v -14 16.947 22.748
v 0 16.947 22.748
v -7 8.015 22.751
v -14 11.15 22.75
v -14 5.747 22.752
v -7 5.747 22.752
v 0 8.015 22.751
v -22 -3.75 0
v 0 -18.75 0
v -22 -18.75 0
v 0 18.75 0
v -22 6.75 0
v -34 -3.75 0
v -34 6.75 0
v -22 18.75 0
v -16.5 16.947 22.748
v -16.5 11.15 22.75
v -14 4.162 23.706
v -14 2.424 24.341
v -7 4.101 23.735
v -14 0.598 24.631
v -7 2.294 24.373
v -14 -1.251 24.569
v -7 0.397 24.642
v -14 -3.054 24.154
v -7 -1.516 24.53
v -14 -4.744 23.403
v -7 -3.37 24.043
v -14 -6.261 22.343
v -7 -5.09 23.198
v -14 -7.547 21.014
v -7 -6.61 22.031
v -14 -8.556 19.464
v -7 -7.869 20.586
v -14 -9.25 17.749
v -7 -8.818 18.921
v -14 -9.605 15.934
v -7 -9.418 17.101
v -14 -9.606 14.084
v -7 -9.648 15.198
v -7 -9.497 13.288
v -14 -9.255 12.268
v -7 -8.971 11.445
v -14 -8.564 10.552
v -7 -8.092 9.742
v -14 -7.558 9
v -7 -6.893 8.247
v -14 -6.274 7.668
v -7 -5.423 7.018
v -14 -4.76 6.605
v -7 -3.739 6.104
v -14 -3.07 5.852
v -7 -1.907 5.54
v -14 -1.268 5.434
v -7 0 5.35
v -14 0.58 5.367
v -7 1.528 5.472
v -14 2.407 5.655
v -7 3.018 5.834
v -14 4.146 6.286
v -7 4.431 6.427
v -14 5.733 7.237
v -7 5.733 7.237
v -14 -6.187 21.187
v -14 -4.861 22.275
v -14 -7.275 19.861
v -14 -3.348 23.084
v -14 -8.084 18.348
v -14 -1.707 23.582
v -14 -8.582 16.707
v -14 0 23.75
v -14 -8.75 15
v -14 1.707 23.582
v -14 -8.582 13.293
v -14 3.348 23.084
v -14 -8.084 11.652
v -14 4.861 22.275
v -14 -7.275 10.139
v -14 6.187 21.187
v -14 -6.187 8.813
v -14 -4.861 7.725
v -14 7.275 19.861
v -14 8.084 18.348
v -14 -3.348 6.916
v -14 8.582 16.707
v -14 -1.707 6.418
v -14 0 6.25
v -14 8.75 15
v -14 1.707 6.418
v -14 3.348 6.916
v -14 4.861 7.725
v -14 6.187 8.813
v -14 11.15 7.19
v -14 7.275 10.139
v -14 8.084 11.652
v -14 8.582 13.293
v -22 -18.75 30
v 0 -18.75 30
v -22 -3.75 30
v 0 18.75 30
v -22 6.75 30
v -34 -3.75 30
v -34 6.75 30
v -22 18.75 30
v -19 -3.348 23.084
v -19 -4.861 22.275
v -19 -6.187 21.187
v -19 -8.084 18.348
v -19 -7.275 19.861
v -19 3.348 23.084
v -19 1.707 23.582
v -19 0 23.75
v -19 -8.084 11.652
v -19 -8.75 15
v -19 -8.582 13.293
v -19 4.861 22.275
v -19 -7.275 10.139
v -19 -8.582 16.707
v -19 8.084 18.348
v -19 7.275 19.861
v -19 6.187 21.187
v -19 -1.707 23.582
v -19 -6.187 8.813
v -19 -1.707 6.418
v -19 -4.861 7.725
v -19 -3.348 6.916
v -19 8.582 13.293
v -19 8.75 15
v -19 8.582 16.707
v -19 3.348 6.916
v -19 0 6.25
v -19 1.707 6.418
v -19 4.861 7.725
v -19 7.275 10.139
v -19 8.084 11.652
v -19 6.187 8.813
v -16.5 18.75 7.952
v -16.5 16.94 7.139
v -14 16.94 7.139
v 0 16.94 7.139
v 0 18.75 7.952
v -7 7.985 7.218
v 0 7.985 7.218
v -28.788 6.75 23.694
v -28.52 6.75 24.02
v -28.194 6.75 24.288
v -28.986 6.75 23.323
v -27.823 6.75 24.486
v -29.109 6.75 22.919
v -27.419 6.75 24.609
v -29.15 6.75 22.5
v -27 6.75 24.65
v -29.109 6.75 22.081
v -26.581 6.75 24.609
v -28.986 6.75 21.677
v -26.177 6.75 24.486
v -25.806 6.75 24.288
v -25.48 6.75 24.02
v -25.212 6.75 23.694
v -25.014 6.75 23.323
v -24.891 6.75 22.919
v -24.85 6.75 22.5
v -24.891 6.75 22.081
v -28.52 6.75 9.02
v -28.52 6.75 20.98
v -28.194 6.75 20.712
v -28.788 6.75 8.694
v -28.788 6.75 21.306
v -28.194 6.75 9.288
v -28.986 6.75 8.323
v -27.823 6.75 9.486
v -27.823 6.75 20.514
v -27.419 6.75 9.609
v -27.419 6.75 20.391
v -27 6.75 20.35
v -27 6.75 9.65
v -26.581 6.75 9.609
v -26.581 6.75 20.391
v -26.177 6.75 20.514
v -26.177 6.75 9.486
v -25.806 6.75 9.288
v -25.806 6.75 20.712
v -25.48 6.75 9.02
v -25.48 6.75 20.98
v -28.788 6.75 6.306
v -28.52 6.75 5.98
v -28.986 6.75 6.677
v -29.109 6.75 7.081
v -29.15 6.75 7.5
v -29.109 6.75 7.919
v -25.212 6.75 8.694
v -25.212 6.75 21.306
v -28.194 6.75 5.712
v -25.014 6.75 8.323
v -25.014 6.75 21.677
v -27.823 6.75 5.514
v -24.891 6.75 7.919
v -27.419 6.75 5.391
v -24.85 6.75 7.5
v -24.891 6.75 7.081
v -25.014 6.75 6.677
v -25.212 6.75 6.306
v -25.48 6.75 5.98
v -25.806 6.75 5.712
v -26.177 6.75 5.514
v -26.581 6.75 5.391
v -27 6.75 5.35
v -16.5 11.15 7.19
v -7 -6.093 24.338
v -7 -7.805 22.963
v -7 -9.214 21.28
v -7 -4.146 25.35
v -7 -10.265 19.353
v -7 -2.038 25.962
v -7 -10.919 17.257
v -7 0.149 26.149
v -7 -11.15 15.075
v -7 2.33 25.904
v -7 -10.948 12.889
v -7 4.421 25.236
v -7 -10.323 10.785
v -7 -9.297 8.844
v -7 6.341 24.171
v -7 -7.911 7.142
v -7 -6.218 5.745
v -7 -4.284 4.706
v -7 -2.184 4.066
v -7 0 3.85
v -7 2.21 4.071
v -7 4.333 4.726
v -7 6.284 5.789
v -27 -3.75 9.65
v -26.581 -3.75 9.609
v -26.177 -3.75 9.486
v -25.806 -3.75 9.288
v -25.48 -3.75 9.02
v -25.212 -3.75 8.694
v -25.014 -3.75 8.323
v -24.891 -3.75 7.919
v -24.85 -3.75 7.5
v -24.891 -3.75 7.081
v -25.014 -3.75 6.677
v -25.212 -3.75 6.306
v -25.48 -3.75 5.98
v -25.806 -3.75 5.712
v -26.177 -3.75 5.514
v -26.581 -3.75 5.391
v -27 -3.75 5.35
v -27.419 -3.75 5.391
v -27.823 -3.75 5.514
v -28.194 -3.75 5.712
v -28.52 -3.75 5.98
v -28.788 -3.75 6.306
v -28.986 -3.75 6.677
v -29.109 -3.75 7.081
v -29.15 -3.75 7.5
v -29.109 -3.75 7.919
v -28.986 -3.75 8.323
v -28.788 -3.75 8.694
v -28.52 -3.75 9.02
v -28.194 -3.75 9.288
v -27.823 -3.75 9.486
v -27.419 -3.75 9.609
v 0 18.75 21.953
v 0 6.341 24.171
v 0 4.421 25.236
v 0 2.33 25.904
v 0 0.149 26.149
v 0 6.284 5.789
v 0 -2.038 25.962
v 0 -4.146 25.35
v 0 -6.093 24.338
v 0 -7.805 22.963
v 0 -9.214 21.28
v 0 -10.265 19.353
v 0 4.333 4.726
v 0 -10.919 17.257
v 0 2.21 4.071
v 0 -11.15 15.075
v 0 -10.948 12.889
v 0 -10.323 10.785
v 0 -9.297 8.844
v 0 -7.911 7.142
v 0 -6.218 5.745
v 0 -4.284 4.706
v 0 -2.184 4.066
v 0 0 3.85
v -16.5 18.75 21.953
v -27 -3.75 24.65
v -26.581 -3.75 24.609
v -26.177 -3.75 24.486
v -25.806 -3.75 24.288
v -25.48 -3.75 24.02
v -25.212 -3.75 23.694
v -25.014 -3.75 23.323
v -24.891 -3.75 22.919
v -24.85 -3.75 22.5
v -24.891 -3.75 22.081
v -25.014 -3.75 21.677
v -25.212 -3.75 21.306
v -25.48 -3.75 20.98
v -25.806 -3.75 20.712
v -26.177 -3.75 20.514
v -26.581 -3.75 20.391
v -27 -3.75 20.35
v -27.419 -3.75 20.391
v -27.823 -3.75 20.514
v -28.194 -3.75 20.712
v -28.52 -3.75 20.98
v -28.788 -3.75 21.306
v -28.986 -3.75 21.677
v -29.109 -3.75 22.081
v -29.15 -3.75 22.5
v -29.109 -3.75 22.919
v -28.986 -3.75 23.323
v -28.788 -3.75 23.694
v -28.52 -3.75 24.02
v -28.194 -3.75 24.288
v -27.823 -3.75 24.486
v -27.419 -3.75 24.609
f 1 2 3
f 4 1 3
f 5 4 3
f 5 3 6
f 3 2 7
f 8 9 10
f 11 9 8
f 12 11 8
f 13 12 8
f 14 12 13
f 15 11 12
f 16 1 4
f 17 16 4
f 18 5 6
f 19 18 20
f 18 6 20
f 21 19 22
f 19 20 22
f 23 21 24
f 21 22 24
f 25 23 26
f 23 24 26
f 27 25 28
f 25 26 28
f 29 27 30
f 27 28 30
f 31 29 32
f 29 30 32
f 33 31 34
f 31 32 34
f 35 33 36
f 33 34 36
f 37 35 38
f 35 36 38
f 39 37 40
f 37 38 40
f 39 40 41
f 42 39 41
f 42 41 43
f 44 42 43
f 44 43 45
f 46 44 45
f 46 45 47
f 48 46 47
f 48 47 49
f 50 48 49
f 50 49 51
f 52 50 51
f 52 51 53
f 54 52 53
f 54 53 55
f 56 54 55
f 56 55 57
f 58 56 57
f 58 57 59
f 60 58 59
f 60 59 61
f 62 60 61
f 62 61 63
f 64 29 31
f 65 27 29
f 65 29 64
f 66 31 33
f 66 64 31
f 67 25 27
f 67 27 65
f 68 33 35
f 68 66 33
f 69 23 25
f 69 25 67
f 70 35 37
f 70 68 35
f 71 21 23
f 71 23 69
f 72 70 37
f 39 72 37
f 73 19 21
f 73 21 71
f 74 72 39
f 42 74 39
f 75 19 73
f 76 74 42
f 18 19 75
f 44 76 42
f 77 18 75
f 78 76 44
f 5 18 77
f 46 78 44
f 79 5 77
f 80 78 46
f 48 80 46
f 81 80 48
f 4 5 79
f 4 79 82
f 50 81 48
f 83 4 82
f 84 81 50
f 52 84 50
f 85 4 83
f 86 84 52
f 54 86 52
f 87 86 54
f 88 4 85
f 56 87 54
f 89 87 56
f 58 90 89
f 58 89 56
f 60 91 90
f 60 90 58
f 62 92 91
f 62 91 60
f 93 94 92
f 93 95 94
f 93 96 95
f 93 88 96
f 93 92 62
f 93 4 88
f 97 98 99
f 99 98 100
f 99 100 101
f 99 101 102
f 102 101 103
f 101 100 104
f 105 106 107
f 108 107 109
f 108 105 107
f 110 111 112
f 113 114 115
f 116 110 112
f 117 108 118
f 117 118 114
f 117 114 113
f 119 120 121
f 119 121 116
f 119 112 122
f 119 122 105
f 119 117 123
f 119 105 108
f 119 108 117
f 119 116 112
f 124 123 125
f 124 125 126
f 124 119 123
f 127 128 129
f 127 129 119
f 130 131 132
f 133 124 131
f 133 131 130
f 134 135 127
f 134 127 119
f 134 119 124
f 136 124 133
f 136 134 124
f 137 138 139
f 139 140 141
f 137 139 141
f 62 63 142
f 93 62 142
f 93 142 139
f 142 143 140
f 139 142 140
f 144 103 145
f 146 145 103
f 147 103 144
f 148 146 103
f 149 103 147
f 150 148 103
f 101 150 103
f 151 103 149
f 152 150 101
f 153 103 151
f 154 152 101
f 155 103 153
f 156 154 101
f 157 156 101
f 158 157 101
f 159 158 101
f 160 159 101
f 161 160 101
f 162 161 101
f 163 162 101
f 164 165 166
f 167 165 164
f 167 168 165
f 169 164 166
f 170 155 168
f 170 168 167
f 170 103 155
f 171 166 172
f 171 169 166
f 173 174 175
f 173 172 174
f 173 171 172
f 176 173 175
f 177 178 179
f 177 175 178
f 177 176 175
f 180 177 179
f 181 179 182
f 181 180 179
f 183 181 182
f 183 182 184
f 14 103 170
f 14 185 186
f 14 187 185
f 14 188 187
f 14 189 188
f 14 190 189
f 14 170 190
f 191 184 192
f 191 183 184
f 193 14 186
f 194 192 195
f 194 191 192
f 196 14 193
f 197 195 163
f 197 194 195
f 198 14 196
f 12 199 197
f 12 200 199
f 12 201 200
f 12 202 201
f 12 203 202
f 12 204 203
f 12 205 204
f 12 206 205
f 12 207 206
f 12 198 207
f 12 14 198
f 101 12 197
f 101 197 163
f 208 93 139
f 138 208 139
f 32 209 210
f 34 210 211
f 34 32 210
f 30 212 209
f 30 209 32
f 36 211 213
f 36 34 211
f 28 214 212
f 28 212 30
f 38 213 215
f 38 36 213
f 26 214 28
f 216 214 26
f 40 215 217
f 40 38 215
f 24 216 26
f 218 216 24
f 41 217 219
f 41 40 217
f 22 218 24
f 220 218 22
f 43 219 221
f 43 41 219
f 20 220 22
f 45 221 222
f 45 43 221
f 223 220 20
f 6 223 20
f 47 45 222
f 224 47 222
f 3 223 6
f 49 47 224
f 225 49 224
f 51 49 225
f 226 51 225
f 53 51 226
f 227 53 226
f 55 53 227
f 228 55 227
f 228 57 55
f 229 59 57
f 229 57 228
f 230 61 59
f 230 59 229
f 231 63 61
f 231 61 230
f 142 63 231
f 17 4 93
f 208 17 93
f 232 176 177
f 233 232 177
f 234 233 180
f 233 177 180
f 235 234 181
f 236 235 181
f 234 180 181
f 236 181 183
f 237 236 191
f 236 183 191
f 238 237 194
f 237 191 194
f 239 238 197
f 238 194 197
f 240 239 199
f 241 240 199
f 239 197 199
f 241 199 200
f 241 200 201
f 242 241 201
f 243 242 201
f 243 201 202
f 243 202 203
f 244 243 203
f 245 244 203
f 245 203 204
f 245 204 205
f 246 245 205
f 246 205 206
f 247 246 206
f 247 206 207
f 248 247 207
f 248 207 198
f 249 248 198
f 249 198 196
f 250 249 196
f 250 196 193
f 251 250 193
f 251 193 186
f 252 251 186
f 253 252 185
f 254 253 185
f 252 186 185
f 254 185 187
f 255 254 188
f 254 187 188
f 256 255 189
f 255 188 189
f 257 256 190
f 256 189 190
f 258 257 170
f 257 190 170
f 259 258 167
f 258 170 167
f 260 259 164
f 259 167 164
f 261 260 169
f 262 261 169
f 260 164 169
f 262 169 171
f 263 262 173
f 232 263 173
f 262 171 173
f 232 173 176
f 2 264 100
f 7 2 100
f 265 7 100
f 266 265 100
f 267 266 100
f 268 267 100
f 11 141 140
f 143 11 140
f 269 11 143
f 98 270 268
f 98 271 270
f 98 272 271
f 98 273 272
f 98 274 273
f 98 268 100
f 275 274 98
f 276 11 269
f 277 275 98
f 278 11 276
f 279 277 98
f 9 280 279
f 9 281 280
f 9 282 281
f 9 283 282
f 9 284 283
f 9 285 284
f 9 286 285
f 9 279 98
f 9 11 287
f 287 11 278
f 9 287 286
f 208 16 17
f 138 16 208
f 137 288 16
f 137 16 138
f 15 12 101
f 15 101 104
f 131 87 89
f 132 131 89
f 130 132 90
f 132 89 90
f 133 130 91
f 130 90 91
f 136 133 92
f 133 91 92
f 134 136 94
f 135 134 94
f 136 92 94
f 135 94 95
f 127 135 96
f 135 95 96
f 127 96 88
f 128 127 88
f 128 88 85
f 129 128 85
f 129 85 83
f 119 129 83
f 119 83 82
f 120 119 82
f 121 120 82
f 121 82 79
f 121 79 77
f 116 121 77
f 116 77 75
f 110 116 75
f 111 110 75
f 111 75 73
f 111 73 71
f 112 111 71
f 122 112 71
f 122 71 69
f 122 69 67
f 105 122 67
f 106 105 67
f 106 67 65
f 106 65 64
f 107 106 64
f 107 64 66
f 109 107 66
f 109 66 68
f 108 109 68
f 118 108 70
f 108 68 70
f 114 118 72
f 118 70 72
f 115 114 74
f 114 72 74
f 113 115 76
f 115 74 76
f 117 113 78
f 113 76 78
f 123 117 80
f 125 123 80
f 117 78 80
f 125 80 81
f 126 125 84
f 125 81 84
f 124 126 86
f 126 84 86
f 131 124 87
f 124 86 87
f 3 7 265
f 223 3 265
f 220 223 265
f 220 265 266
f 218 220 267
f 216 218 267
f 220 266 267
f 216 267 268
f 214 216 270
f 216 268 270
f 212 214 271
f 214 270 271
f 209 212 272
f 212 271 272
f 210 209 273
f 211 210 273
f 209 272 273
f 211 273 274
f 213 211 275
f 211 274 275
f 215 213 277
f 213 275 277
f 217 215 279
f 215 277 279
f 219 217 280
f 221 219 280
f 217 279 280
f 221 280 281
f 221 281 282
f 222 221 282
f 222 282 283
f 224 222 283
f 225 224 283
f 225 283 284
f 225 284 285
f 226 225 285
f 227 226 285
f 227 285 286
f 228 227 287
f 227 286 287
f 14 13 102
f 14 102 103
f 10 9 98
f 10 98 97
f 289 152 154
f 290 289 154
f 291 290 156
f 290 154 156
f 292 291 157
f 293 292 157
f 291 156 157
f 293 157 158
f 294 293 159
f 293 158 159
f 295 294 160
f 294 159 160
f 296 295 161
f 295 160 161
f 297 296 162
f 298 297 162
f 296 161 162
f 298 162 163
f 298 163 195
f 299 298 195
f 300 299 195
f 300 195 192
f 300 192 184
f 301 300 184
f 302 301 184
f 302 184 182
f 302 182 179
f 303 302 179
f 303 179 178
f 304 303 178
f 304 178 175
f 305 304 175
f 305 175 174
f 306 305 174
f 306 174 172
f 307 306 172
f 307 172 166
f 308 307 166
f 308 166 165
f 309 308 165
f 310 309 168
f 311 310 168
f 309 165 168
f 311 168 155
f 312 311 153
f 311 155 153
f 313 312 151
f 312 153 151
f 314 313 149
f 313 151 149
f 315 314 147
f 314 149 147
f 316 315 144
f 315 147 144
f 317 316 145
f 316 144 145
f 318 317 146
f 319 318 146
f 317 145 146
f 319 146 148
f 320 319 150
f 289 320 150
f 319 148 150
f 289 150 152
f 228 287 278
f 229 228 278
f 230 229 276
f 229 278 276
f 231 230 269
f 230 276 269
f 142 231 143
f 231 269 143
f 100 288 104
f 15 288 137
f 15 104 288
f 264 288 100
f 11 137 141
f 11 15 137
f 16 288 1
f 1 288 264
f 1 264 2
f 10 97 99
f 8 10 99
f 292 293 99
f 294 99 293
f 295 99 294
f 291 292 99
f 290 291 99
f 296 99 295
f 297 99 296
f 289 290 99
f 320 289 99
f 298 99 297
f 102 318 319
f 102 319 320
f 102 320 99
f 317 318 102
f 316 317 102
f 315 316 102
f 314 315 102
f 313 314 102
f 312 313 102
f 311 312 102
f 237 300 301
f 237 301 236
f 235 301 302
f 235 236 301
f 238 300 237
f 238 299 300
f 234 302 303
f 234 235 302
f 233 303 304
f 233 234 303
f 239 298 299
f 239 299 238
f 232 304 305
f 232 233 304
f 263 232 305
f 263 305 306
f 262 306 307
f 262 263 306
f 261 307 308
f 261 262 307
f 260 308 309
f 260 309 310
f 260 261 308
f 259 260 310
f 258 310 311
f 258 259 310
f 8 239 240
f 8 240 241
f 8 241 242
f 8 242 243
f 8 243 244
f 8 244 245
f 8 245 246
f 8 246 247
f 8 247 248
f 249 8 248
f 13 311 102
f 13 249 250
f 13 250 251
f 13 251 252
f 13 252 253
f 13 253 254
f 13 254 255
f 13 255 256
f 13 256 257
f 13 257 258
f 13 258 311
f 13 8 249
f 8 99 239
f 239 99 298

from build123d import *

# Parameters (mm, degrees)
EXTRUDE_491_DEPTH      = 30
CUT_EXTRUDE_1383_DEPTH = 19
CUT_EXTRUDE_1659_DEPTH = 14
CUT_EXTRUDE_2951_DEPTH = 7
CUT_EXTRUDE_5_DEPTH    = 16.5
CUT_EXTRUDE_6_REACH    = 54.022
SKETCH_3_R             = 2.15


with BuildPart() as part:
    # Sketch 319 → Extrude 491 (new body)
    with BuildSketch(Plane.XY):
        Polygon((0, 18.75), (0, -18.75), (-22, -18.75), (-22, -3.75), (-34, -3.75), (-34, 6.75), (-22, 6.75), (-22, 18.75), align=None)
    extrude(amount=EXTRUDE_491_DEPTH)

    # Эскиз2<5> → Cut-Extrude 1383 (cut)
    with BuildSketch(Plane(origin=(0, 0, 0), x_dir=(0, 0, -1), z_dir=(1, 0, 0))):
        with BuildLine():
            ThreePointArc((-22.752990961, 4.056307577), (-14.994684129, -8.749998385), (-7.251943403, 4.065724901))
            ThreePointArc((-7.251943403, 4.065724901), (-15.005315871, 8.749998385), (-22.752990961, 4.056307577))
        make_face()
    extrude(amount=-CUT_EXTRUDE_1383_DEPTH, mode=Mode.SUBTRACT)

    # Эскиз2<6> → Cut-Extrude 1659 (cut)
    with BuildSketch(Plane(origin=(0, 0, 0), x_dir=(0, 0, -1), z_dir=(1, 0, 0))):
        with BuildLine():
            ThreePointArc((-22.752278555, 5.746710121), (-15.008722765, -9.649996058), (-7.237345061, 5.732685958))
            Line((-7.237345061, 5.732685958), (-7.139195711, 16.940201189))
            Line((-7.139195711, 16.940201189), (-7.952107708, 18.75))
            Line((-7.952107708, 18.75), (-21.953209217, 18.75))
            Line((-21.953209217, 18.75), (-22.747558186, 16.94723086))
            Line((-22.747558186, 16.94723086), (-22.752278555, 5.746710121))
        make_face()
    extrude(amount=-CUT_EXTRUDE_1659_DEPTH, mode=Mode.SUBTRACT)

    # Sketch 557 → Cut-Extrude 2951 (cut)
    with BuildSketch(Plane(origin=(0, 0, 0), x_dir=(0, 0, -1), z_dir=(1, 0, 0))):
        with BuildLine():
            Line((-22.752278555, 5.746710121), (-22.751322621, 8.014954624))
            ThreePointArc((-22.751322621, 8.014954624), (-19.352887132, -10.265226428), (-3.85, 0))
            ThreePointArc((-3.85, 0), (-4.726344075, 4.332954411), (-7.21762223, 7.984804083))
            Line((-7.21762223, 7.984804083), (-7.237345061, 5.732685958))
            ThreePointArc((-7.237345061, 5.732685958), (-5.833972503, 3.017687843), (-5.35, 0))
            ThreePointArc((-5.35, 0), (-18.025971906, -9.163296024), (-22.752278555, 5.746710121))
        make_face()
    extrude(amount=-CUT_EXTRUDE_2951_DEPTH, mode=Mode.SUBTRACT)

    # Эскиз под резистор и подшипник<7> → Вырез-Вытянуть5 (cut)
    with BuildSketch(Plane(origin=(0, 0, 0), x_dir=(0, 0, -1), z_dir=(1, 0, 0))):
        Polygon((-22.747558186, 16.94723086), (-22.750001382, 11.15), (-15, 11.15), (-7.189903158, 11.15), (-7.139195711, 16.940201189), (-7.952107708, 18.75), (-21.953209217, 18.75), align=None)
    extrude(amount=-CUT_EXTRUDE_5_DEPTH, mode=Mode.SUBTRACT)

    # Эскиз3 → Вырез-Вытянуть6 (cut, up to next)
    with BuildSketch(Plane(origin=(0, 6.75, 0), x_dir=(1, 0, 0), z_dir=(0, 1, 0)), mode=Mode.PRIVATE) as cut_extrude_6_sk1:
        with Locations((-27, -7.5)):
            Circle(SKETCH_3_R)
    cut_extrude_6_tool1 = extrude(cut_extrude_6_sk1.sketch, amount=-CUT_EXTRUDE_6_REACH, mode=Mode.PRIVATE) & part.part
    # Эскиз3 → Вырез-Вытянуть6 (cut, up to next)
    with BuildSketch(Plane(origin=(0, 6.75, 0), x_dir=(1, 0, 0), z_dir=(0, 1, 0)), mode=Mode.PRIVATE) as cut_extrude_6_sk2:
        with Locations((-27, -22.5)):
            Circle(SKETCH_3_R)
    cut_extrude_6_tool2 = extrude(cut_extrude_6_sk2.sketch, amount=-CUT_EXTRUDE_6_REACH, mode=Mode.PRIVATE) & part.part
    add(cut_extrude_6_tool1.solids().sort_by_distance((-27, 6.75, 7.5))[0], mode=Mode.SUBTRACT)
    add(cut_extrude_6_tool2.solids().sort_by_distance((-27, 6.75, 22.5))[0], mode=Mode.SUBTRACT)


solid = part.part
